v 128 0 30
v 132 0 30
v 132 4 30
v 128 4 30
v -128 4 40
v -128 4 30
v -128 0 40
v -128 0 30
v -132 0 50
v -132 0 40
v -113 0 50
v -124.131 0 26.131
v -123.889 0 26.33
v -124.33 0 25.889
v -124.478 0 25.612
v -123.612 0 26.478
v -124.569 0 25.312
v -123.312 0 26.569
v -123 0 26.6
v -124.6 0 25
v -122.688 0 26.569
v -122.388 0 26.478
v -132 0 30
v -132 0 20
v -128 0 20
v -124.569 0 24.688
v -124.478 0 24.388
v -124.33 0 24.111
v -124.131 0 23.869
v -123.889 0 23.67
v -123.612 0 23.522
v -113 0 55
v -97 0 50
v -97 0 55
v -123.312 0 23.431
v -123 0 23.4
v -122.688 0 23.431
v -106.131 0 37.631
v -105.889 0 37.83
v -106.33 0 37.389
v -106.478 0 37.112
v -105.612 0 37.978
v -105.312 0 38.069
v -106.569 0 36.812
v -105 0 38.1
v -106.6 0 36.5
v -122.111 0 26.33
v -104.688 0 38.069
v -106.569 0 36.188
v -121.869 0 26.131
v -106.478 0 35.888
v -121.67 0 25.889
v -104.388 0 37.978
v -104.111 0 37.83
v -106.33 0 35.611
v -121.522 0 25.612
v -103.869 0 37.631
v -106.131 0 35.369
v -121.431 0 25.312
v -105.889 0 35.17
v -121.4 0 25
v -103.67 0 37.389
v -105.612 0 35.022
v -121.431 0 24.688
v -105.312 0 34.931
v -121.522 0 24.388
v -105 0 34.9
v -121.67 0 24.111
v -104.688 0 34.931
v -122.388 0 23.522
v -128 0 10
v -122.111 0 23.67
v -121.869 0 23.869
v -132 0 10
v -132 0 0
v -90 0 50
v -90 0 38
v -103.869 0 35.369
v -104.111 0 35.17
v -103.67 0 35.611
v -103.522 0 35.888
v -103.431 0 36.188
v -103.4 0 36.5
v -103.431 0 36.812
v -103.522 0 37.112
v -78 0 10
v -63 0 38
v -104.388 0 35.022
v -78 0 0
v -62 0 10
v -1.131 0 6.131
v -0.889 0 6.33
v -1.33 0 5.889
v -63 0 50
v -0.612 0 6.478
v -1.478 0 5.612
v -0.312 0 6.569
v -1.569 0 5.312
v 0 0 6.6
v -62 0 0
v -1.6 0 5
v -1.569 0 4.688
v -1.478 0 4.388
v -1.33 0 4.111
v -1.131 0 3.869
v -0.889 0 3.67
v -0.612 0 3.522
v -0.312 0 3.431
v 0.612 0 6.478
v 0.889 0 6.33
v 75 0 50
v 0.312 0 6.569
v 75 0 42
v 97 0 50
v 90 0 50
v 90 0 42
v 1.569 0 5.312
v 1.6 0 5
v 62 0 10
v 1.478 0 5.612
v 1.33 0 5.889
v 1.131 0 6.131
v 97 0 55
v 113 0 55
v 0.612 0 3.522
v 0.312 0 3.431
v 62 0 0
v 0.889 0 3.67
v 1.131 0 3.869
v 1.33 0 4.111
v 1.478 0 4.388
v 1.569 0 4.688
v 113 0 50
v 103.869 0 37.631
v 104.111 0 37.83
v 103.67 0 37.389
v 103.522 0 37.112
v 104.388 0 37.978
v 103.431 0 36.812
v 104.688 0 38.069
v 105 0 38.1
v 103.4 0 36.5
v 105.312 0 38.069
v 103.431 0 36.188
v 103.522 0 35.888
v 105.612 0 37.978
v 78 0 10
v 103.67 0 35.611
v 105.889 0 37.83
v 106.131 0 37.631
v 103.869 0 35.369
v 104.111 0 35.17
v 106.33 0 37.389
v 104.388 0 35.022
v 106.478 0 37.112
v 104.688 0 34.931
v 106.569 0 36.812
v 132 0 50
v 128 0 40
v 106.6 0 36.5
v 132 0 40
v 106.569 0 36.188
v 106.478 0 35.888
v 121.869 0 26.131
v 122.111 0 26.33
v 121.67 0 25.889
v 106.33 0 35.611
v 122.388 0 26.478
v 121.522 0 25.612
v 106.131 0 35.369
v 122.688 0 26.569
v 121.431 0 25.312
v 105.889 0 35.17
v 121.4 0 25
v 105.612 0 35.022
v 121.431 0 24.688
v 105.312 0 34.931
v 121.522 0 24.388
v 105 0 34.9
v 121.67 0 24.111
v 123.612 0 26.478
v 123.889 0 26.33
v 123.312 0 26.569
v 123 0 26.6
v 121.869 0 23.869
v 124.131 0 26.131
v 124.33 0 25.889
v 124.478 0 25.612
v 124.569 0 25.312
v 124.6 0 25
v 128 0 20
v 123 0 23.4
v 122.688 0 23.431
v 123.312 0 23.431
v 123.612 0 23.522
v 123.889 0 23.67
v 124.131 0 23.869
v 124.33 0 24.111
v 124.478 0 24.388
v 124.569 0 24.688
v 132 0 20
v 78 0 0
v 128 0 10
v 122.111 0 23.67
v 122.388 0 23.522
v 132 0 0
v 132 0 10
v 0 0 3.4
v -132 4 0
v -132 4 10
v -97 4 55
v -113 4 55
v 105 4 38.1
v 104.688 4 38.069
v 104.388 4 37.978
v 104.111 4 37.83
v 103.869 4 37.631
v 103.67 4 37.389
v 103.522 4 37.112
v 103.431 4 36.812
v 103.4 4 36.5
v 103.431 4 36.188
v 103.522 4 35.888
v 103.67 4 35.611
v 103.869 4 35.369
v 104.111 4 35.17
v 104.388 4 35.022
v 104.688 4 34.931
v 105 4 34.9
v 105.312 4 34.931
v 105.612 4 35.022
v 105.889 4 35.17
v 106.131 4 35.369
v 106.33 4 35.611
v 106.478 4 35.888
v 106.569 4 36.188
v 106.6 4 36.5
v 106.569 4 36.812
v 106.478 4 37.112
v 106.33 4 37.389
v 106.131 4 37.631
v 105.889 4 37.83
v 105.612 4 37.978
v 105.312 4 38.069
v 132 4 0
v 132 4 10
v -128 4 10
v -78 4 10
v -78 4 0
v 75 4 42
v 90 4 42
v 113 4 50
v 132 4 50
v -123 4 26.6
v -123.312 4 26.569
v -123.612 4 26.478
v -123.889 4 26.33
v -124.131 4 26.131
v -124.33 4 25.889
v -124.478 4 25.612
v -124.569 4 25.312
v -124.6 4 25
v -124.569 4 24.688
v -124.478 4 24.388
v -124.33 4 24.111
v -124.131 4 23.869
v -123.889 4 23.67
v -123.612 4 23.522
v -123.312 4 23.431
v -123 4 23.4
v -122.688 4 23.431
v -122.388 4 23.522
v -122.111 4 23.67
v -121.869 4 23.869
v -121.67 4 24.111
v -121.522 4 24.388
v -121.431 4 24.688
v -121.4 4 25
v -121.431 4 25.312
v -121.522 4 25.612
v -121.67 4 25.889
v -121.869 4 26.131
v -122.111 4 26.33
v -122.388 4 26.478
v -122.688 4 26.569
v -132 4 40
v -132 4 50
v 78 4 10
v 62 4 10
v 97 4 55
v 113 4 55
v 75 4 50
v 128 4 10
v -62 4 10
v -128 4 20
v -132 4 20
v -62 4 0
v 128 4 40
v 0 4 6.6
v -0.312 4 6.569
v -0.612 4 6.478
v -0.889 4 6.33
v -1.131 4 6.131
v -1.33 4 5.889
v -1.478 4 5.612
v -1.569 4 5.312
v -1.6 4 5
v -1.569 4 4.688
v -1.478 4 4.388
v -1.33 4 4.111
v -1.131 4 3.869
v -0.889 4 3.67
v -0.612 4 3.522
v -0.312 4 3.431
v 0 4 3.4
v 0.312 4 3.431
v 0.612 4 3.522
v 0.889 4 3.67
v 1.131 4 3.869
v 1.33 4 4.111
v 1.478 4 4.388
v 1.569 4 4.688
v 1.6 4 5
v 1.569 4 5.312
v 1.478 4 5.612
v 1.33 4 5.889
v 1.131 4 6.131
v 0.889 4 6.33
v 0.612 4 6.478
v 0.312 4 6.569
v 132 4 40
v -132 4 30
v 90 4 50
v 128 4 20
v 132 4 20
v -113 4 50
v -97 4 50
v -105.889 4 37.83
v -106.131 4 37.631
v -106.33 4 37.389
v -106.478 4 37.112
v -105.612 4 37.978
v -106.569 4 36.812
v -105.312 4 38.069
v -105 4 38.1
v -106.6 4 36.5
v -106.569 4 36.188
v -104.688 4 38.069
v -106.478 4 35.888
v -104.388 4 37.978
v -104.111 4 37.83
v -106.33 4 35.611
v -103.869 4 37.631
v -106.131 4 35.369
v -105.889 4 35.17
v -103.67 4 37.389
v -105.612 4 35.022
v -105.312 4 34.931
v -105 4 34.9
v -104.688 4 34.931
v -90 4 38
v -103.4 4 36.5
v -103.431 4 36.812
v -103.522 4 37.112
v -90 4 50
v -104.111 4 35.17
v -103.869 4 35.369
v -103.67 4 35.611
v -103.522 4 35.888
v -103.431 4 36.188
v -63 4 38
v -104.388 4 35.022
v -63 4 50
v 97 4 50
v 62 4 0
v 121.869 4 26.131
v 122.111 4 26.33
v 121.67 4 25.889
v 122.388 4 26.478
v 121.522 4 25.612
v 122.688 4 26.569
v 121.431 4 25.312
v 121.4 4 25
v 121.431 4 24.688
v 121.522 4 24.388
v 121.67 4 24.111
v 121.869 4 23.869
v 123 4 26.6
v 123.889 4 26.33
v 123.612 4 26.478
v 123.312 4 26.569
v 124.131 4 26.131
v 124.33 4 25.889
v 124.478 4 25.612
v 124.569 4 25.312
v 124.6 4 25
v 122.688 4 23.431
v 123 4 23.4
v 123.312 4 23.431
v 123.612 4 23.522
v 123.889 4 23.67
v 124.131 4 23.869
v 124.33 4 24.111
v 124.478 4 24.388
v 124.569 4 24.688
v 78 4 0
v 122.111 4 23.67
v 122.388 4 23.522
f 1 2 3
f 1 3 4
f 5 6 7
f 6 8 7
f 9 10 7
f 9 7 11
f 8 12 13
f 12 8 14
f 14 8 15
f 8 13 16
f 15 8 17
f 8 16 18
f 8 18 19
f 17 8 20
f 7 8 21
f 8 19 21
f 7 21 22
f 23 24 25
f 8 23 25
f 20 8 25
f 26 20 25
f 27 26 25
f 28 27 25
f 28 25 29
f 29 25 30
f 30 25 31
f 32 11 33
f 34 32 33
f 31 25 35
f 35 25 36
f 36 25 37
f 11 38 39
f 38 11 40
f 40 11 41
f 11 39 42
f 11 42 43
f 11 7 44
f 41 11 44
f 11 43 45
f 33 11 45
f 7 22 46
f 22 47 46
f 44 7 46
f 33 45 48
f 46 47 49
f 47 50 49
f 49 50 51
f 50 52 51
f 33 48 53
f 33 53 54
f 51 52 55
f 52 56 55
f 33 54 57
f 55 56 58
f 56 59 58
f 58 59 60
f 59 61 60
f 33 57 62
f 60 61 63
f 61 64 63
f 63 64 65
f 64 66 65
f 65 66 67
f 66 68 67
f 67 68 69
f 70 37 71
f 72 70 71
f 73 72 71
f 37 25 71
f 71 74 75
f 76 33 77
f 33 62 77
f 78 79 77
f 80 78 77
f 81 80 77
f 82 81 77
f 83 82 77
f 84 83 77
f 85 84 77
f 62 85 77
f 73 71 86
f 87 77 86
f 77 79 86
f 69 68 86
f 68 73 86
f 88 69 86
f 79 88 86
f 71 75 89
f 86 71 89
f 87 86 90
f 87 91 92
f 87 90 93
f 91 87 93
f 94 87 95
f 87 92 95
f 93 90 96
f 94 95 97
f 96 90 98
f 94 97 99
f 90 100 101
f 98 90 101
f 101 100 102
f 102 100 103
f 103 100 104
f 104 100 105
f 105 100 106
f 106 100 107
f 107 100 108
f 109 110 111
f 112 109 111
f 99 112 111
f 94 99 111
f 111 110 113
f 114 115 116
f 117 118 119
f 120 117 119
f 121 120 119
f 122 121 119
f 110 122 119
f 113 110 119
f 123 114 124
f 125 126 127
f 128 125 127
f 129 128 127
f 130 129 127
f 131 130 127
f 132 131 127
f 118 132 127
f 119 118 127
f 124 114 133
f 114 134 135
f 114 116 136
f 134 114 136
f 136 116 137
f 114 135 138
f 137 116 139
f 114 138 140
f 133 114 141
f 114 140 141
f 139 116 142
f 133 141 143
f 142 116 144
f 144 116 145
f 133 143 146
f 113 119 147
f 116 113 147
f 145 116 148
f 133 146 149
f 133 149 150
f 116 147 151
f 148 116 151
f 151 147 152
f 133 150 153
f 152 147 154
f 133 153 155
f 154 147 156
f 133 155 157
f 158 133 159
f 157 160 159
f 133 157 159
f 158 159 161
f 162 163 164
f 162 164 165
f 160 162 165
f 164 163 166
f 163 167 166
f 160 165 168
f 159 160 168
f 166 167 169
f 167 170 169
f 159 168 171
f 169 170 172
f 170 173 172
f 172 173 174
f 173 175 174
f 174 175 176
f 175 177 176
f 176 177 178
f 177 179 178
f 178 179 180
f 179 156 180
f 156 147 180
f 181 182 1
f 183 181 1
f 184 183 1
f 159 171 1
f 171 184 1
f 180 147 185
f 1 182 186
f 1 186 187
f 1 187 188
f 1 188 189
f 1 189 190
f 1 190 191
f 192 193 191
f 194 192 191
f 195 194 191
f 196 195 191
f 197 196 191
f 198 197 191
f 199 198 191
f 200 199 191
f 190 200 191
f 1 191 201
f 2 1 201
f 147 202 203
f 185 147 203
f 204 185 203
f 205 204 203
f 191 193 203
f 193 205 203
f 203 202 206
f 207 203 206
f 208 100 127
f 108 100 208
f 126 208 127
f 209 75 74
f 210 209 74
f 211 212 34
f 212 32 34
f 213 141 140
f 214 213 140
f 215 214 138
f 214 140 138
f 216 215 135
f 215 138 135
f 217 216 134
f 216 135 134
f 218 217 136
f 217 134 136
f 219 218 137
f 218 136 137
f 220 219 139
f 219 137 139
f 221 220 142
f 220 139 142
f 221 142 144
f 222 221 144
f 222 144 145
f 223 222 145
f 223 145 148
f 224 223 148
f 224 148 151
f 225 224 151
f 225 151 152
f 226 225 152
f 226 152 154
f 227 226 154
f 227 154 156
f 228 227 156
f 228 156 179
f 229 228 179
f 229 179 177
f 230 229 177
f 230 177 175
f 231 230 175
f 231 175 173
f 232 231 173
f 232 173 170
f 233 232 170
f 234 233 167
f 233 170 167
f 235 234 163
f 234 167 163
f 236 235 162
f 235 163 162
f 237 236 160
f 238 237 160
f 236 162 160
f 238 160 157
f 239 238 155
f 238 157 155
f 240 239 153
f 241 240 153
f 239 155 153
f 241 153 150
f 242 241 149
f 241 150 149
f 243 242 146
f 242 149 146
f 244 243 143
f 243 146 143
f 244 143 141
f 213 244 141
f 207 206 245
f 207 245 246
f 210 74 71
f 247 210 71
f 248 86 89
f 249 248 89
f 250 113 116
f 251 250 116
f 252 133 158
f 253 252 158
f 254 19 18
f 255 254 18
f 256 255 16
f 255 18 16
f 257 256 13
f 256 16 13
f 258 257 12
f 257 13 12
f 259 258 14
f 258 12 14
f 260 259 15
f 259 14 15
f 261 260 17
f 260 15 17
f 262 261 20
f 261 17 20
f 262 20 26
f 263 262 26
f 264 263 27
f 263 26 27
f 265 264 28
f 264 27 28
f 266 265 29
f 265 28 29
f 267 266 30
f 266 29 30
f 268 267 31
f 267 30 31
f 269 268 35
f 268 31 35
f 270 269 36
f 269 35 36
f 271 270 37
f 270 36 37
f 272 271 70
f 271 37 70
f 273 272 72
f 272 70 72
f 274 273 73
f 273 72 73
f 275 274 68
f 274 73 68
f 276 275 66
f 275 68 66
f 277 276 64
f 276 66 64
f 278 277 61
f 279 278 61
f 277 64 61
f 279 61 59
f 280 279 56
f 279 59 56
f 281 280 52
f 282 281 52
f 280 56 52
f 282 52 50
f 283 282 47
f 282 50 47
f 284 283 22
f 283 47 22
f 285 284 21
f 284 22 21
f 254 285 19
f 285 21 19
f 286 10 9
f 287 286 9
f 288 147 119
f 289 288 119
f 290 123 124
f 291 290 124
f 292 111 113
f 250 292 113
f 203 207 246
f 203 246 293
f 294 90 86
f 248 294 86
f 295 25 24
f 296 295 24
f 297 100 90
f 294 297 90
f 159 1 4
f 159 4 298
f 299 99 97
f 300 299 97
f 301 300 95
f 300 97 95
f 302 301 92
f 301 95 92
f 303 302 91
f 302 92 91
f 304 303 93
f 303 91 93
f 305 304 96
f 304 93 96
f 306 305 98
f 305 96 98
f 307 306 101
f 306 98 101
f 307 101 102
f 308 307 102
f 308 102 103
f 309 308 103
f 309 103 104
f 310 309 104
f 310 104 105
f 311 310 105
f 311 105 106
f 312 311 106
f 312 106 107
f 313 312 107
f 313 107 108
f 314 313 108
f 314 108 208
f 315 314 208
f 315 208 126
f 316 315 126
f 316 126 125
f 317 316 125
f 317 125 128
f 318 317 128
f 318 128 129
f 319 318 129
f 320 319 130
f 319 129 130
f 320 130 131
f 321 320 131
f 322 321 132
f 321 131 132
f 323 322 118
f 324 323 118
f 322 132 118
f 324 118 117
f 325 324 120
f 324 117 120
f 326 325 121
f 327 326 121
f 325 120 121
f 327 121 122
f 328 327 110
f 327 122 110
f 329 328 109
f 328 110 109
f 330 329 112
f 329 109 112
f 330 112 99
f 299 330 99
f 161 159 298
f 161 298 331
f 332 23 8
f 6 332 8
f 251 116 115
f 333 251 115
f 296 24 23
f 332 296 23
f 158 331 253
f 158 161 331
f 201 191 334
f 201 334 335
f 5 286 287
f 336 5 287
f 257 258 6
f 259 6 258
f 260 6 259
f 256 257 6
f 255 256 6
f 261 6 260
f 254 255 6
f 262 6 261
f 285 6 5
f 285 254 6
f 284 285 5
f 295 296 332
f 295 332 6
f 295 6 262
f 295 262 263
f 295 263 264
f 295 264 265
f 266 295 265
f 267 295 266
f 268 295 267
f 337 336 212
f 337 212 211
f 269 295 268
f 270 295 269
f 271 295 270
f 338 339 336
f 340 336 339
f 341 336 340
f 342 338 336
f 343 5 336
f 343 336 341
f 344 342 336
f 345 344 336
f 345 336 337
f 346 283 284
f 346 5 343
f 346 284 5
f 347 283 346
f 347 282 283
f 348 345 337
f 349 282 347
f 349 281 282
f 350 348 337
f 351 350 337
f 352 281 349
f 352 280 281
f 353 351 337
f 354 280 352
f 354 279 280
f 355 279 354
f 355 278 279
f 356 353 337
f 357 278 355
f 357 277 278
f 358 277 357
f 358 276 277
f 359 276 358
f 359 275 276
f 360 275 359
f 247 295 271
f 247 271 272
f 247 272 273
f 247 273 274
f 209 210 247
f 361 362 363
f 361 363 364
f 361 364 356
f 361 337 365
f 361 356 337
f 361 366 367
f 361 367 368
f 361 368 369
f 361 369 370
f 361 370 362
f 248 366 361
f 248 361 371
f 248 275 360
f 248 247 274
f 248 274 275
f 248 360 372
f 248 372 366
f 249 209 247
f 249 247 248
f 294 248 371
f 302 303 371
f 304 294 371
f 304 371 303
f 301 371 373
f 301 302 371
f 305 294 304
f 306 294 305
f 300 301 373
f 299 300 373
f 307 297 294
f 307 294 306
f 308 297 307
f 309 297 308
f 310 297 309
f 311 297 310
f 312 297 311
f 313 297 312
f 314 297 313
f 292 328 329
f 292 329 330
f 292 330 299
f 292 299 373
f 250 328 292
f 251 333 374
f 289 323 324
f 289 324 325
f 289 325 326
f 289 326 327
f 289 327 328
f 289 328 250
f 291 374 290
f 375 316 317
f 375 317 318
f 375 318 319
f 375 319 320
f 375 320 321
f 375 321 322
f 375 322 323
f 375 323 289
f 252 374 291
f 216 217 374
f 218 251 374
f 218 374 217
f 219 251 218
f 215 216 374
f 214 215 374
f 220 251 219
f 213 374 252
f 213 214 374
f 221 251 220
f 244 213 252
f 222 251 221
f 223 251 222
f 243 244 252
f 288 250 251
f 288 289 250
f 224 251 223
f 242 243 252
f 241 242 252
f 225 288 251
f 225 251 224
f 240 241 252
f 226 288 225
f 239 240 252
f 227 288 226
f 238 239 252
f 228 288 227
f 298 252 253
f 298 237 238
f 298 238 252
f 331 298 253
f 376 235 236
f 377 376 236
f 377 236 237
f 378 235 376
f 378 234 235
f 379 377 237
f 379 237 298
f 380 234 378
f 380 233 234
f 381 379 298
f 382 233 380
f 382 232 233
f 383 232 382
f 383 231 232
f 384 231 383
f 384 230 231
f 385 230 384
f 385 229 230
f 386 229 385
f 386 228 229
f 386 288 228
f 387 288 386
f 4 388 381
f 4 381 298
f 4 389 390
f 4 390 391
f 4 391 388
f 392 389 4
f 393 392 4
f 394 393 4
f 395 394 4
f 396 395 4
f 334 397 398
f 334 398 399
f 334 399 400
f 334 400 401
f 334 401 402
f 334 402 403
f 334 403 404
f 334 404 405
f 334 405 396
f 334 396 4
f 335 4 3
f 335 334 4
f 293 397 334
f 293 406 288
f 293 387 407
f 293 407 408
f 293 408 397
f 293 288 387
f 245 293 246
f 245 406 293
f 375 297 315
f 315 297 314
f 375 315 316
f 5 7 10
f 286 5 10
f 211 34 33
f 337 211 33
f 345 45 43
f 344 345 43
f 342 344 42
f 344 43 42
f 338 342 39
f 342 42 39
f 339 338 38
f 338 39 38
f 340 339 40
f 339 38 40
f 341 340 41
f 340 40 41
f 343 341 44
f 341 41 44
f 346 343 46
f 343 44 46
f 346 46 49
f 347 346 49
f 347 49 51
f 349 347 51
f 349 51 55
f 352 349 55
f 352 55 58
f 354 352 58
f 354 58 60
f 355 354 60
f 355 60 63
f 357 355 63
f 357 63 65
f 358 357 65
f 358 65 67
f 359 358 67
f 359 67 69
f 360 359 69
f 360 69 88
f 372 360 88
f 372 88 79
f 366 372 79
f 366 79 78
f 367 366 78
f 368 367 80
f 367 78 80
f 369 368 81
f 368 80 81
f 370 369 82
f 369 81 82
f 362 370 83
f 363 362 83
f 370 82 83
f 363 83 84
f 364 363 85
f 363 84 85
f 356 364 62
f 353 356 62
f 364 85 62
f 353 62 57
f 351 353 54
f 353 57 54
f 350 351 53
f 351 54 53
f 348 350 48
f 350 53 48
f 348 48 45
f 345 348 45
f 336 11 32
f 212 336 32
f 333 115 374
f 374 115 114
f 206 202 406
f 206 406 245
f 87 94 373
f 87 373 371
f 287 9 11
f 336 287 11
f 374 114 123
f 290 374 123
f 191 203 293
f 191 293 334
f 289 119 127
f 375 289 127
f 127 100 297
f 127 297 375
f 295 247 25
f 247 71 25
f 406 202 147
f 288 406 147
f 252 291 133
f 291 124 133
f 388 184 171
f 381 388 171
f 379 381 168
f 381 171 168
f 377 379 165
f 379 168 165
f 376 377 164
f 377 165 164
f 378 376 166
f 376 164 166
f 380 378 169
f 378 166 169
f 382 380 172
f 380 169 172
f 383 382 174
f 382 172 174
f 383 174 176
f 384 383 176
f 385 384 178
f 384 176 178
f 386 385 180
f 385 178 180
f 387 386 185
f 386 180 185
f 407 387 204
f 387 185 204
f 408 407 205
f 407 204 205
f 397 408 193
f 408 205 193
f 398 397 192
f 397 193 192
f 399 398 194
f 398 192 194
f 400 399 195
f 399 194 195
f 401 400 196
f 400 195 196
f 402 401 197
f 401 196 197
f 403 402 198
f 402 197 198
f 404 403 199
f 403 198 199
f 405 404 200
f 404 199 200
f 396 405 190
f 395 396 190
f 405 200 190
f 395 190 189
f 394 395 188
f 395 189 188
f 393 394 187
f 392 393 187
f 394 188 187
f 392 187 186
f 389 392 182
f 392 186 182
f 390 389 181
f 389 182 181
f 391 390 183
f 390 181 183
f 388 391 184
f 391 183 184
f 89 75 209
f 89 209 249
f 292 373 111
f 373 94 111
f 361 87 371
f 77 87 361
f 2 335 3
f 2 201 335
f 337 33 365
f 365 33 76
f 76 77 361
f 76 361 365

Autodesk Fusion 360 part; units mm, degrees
sketch "スケッチ1" plane through (0, 0, 0) normal (0, 1, 0) x (1, 0, 0)
  line L0 (-132, 0) -> (132, 0)
  line L1 (-132, 0) -> (-132, -10)
  line L2 (-132, -10) -> (-128, -10)
  line L3 (-128, -10) -> (-128, -20)
  line L4 (-128, -20) -> (-132, -20)
  line L5 (-132, -20) -> (-132, -30)
  line L6 (-132, -30) -> (-128, -30)
  line L7 (-128, -30) -> (-128, -40)
  line L8 (-128, -40) -> (-132, -40)
  line L9 (-132, -40) -> (-132, -50)
  line L10 (-132, -50) -> (132, -50)
  line L11 (132, 0) -> (132, -10)
  line L12 (132, -10) -> (128, -10)
  line L13 (128, -10) -> (128, -20)
  line L14 (128, -20) -> (132, -20)
  line L15 (132, -20) -> (132, -30)
  line L16 (132, -30) -> (128, -30)
  line L17 (128, -30) -> (128, -40)
  line L18 (128, -40) -> (132, -40)
  line L19 (132, -40) -> (132, -50)
  line L20 (-78, 0) -> (-62, 0)
  line L21 (-62, 0) -> (-62, -10)
  line L22 (-62, -10) -> (-78, -10)
  line L23 (-78, -10) -> (-78, 0)
  line L24 (62, 0) -> (78, 0)
  line L25 (78, 0) -> (78, -10)
  line L26 (78, -10) -> (62, -10)
  line L27 (62, -10) -> (62, 0)
  line L28 (-113, -55) -> (-97, -55)
  line L29 (-97, -55) -> (-97, -50)
  line L30 (-97, -50) -> (-113, -50)
  line L31 (-113, -50) -> (-113, -55)
  line L32 (97, -55) -> (113, -55)
  line L33 (113, -55) -> (113, -50)
  line L34 (113, -50) -> (97, -50)
  line L35 (97, -50) -> (97, -55)
  line L36 (-90, -50) -> (-63, -50)
  line L37 (-63, -50) -> (-63, -38)
  line L38 (-63, -38) -> (-90, -38)
  line L39 (-90, -38) -> (-90, -50)
  line L40 (90, -50) -> (75, -50)
  line L41 (75, -50) -> (75, -42)
  line L42 (75, -42) -> (90, -42)
  line L43 (90, -42) -> (90, -50)
  point P0 (0, -25)
  point P1 (-105, -50)
  point P2 (105, -50)
  dimension "d1" = 264
  dimension "d2" = 10
  dimension "d3" = 10
  dimension "d4" = 10
  dimension "d5" = 10
  dimension "d6" = 10
  dimension "d7" = 4
  dimension "d9" = 4
  dimension "d40" = 62
  dimension "d41" = 16
  dimension "d42" = 10
  dimension "d43" = 62
  dimension "d45" = 5
  dimension "d46" = 16
  dimension "d47" = 105
  dimension "d48" = 105
  dimension "d51" = 63
  dimension "d52" = 27
  dimension "d53" = 12
  dimension "d54" = 75
  dimension "d55" = 15
  dimension "d56" = 8
extrude "押し出し1" add sketch "スケッチ1" along normal blind 4 contours L0 L1 L2 L3 L4 L5 L6 L7 L8 L9 L10 L11 L12 L13 L14 L15 L16 L17 L18 L19 L21 L22 L23 L25 L26 L27 L30 L34 L37 L38 L39 L41 L42 L43 | L10 L28 L29 L30 L31 | L10 L32 L33 L34 L35
sketch "スケッチ2" plane through (0, 4, 0) normal (0, 1, 0) x (-1, 0, 0)
  line L0 (-132, 50) -> (-132, 40)
  line L1 (-132, 40) -> (-128, 40)
  line L2 (-128, 40) -> (-128, 30)
  line L3 (-128, 30) -> (-132, 30)
  line L4 (-132, 30) -> (-132, 20)
  line L5 (-132, 20) -> (-128, 20)
  line L6 (-128, 20) -> (-128, 10)
  line L7 (-128, 10) -> (-132, 10)
  line L8 (-132, 10) -> (-132, 0)
  line L9 (-62, 0) -> (62, 0)
  line L10 (123, 25) -> (-123, 25)
  line L11 (105, 36.5) -> (-105, 36.5)
  line L12 (132, 0) -> (132, 10)
  line L13 (132, 10) -> (128, 10)
  line L14 (128, 10) -> (128, 20)
  line L15 (128, 20) -> (132, 20)
  line L16 (132, 20) -> (132, 30)
  line L17 (132, 30) -> (128, 30)
  line L18 (128, 30) -> (128, 40)
  line L19 (128, 40) -> (132, 40)
  line L20 (132, 40) -> (132, 50)
  line L21 (63, 50) -> (-75, 50)
  line L22 (-78, 0) -> (-78, 10)
  line L23 (-78, 10) -> (-62, 10)
  line L24 (-62, 10) -> (-62, 0)
  line L25 (62, 0) -> (62, 10)
  line L26 (62, 10) -> (78, 10)
  line L27 (78, 10) -> (78, 0)
  line L28 (78, 0) -> (132, 0)
  line L29 (-132, 0) -> (-78, 0)
  line L30 (113, 50) -> (113, 55)
  line L31 (113, 55) -> (97, 55)
  line L32 (97, 55) -> (97, 50)
  line L33 (97, 50) -> (90, 50)
  line L34 (-97, 50) -> (-97, 55)
  line L35 (-97, 55) -> (-113, 55)
  line L36 (-113, 55) -> (-113, 50)
  line L37 (-113, 50) -> (-132, 50)
  line L38 (-75, 50) -> (-75, 42)
  line L39 (-75, 42) -> (-90, 42)
  line L40 (-90, 42) -> (-90, 50)
  line L41 (-90, 50) -> (-97, 50)
  line L42 (132, 50) -> (113, 50)
  line L43 (90, 50) -> (90, 38)
  line L44 (90, 38) -> (63, 38)
  line L45 (63, 38) -> (63, 50)
  point P0 (0, 5)
  dimension "d17" = 25
  dimension "d19" = 5
  dimension "d24" = 105
  dimension "d25" = 105
  dimension "d44" = 5
  dimension "d49" = 13.5
  dimension "d50" = 5
hole "穴1" at (-123, 4, 25) at (123, 4, 25) at (-105, 4, 36.5) at (105, 4, 36.5) at (0, 4, 5) direction (0, -1, 0) diameter 3.2 end through all
